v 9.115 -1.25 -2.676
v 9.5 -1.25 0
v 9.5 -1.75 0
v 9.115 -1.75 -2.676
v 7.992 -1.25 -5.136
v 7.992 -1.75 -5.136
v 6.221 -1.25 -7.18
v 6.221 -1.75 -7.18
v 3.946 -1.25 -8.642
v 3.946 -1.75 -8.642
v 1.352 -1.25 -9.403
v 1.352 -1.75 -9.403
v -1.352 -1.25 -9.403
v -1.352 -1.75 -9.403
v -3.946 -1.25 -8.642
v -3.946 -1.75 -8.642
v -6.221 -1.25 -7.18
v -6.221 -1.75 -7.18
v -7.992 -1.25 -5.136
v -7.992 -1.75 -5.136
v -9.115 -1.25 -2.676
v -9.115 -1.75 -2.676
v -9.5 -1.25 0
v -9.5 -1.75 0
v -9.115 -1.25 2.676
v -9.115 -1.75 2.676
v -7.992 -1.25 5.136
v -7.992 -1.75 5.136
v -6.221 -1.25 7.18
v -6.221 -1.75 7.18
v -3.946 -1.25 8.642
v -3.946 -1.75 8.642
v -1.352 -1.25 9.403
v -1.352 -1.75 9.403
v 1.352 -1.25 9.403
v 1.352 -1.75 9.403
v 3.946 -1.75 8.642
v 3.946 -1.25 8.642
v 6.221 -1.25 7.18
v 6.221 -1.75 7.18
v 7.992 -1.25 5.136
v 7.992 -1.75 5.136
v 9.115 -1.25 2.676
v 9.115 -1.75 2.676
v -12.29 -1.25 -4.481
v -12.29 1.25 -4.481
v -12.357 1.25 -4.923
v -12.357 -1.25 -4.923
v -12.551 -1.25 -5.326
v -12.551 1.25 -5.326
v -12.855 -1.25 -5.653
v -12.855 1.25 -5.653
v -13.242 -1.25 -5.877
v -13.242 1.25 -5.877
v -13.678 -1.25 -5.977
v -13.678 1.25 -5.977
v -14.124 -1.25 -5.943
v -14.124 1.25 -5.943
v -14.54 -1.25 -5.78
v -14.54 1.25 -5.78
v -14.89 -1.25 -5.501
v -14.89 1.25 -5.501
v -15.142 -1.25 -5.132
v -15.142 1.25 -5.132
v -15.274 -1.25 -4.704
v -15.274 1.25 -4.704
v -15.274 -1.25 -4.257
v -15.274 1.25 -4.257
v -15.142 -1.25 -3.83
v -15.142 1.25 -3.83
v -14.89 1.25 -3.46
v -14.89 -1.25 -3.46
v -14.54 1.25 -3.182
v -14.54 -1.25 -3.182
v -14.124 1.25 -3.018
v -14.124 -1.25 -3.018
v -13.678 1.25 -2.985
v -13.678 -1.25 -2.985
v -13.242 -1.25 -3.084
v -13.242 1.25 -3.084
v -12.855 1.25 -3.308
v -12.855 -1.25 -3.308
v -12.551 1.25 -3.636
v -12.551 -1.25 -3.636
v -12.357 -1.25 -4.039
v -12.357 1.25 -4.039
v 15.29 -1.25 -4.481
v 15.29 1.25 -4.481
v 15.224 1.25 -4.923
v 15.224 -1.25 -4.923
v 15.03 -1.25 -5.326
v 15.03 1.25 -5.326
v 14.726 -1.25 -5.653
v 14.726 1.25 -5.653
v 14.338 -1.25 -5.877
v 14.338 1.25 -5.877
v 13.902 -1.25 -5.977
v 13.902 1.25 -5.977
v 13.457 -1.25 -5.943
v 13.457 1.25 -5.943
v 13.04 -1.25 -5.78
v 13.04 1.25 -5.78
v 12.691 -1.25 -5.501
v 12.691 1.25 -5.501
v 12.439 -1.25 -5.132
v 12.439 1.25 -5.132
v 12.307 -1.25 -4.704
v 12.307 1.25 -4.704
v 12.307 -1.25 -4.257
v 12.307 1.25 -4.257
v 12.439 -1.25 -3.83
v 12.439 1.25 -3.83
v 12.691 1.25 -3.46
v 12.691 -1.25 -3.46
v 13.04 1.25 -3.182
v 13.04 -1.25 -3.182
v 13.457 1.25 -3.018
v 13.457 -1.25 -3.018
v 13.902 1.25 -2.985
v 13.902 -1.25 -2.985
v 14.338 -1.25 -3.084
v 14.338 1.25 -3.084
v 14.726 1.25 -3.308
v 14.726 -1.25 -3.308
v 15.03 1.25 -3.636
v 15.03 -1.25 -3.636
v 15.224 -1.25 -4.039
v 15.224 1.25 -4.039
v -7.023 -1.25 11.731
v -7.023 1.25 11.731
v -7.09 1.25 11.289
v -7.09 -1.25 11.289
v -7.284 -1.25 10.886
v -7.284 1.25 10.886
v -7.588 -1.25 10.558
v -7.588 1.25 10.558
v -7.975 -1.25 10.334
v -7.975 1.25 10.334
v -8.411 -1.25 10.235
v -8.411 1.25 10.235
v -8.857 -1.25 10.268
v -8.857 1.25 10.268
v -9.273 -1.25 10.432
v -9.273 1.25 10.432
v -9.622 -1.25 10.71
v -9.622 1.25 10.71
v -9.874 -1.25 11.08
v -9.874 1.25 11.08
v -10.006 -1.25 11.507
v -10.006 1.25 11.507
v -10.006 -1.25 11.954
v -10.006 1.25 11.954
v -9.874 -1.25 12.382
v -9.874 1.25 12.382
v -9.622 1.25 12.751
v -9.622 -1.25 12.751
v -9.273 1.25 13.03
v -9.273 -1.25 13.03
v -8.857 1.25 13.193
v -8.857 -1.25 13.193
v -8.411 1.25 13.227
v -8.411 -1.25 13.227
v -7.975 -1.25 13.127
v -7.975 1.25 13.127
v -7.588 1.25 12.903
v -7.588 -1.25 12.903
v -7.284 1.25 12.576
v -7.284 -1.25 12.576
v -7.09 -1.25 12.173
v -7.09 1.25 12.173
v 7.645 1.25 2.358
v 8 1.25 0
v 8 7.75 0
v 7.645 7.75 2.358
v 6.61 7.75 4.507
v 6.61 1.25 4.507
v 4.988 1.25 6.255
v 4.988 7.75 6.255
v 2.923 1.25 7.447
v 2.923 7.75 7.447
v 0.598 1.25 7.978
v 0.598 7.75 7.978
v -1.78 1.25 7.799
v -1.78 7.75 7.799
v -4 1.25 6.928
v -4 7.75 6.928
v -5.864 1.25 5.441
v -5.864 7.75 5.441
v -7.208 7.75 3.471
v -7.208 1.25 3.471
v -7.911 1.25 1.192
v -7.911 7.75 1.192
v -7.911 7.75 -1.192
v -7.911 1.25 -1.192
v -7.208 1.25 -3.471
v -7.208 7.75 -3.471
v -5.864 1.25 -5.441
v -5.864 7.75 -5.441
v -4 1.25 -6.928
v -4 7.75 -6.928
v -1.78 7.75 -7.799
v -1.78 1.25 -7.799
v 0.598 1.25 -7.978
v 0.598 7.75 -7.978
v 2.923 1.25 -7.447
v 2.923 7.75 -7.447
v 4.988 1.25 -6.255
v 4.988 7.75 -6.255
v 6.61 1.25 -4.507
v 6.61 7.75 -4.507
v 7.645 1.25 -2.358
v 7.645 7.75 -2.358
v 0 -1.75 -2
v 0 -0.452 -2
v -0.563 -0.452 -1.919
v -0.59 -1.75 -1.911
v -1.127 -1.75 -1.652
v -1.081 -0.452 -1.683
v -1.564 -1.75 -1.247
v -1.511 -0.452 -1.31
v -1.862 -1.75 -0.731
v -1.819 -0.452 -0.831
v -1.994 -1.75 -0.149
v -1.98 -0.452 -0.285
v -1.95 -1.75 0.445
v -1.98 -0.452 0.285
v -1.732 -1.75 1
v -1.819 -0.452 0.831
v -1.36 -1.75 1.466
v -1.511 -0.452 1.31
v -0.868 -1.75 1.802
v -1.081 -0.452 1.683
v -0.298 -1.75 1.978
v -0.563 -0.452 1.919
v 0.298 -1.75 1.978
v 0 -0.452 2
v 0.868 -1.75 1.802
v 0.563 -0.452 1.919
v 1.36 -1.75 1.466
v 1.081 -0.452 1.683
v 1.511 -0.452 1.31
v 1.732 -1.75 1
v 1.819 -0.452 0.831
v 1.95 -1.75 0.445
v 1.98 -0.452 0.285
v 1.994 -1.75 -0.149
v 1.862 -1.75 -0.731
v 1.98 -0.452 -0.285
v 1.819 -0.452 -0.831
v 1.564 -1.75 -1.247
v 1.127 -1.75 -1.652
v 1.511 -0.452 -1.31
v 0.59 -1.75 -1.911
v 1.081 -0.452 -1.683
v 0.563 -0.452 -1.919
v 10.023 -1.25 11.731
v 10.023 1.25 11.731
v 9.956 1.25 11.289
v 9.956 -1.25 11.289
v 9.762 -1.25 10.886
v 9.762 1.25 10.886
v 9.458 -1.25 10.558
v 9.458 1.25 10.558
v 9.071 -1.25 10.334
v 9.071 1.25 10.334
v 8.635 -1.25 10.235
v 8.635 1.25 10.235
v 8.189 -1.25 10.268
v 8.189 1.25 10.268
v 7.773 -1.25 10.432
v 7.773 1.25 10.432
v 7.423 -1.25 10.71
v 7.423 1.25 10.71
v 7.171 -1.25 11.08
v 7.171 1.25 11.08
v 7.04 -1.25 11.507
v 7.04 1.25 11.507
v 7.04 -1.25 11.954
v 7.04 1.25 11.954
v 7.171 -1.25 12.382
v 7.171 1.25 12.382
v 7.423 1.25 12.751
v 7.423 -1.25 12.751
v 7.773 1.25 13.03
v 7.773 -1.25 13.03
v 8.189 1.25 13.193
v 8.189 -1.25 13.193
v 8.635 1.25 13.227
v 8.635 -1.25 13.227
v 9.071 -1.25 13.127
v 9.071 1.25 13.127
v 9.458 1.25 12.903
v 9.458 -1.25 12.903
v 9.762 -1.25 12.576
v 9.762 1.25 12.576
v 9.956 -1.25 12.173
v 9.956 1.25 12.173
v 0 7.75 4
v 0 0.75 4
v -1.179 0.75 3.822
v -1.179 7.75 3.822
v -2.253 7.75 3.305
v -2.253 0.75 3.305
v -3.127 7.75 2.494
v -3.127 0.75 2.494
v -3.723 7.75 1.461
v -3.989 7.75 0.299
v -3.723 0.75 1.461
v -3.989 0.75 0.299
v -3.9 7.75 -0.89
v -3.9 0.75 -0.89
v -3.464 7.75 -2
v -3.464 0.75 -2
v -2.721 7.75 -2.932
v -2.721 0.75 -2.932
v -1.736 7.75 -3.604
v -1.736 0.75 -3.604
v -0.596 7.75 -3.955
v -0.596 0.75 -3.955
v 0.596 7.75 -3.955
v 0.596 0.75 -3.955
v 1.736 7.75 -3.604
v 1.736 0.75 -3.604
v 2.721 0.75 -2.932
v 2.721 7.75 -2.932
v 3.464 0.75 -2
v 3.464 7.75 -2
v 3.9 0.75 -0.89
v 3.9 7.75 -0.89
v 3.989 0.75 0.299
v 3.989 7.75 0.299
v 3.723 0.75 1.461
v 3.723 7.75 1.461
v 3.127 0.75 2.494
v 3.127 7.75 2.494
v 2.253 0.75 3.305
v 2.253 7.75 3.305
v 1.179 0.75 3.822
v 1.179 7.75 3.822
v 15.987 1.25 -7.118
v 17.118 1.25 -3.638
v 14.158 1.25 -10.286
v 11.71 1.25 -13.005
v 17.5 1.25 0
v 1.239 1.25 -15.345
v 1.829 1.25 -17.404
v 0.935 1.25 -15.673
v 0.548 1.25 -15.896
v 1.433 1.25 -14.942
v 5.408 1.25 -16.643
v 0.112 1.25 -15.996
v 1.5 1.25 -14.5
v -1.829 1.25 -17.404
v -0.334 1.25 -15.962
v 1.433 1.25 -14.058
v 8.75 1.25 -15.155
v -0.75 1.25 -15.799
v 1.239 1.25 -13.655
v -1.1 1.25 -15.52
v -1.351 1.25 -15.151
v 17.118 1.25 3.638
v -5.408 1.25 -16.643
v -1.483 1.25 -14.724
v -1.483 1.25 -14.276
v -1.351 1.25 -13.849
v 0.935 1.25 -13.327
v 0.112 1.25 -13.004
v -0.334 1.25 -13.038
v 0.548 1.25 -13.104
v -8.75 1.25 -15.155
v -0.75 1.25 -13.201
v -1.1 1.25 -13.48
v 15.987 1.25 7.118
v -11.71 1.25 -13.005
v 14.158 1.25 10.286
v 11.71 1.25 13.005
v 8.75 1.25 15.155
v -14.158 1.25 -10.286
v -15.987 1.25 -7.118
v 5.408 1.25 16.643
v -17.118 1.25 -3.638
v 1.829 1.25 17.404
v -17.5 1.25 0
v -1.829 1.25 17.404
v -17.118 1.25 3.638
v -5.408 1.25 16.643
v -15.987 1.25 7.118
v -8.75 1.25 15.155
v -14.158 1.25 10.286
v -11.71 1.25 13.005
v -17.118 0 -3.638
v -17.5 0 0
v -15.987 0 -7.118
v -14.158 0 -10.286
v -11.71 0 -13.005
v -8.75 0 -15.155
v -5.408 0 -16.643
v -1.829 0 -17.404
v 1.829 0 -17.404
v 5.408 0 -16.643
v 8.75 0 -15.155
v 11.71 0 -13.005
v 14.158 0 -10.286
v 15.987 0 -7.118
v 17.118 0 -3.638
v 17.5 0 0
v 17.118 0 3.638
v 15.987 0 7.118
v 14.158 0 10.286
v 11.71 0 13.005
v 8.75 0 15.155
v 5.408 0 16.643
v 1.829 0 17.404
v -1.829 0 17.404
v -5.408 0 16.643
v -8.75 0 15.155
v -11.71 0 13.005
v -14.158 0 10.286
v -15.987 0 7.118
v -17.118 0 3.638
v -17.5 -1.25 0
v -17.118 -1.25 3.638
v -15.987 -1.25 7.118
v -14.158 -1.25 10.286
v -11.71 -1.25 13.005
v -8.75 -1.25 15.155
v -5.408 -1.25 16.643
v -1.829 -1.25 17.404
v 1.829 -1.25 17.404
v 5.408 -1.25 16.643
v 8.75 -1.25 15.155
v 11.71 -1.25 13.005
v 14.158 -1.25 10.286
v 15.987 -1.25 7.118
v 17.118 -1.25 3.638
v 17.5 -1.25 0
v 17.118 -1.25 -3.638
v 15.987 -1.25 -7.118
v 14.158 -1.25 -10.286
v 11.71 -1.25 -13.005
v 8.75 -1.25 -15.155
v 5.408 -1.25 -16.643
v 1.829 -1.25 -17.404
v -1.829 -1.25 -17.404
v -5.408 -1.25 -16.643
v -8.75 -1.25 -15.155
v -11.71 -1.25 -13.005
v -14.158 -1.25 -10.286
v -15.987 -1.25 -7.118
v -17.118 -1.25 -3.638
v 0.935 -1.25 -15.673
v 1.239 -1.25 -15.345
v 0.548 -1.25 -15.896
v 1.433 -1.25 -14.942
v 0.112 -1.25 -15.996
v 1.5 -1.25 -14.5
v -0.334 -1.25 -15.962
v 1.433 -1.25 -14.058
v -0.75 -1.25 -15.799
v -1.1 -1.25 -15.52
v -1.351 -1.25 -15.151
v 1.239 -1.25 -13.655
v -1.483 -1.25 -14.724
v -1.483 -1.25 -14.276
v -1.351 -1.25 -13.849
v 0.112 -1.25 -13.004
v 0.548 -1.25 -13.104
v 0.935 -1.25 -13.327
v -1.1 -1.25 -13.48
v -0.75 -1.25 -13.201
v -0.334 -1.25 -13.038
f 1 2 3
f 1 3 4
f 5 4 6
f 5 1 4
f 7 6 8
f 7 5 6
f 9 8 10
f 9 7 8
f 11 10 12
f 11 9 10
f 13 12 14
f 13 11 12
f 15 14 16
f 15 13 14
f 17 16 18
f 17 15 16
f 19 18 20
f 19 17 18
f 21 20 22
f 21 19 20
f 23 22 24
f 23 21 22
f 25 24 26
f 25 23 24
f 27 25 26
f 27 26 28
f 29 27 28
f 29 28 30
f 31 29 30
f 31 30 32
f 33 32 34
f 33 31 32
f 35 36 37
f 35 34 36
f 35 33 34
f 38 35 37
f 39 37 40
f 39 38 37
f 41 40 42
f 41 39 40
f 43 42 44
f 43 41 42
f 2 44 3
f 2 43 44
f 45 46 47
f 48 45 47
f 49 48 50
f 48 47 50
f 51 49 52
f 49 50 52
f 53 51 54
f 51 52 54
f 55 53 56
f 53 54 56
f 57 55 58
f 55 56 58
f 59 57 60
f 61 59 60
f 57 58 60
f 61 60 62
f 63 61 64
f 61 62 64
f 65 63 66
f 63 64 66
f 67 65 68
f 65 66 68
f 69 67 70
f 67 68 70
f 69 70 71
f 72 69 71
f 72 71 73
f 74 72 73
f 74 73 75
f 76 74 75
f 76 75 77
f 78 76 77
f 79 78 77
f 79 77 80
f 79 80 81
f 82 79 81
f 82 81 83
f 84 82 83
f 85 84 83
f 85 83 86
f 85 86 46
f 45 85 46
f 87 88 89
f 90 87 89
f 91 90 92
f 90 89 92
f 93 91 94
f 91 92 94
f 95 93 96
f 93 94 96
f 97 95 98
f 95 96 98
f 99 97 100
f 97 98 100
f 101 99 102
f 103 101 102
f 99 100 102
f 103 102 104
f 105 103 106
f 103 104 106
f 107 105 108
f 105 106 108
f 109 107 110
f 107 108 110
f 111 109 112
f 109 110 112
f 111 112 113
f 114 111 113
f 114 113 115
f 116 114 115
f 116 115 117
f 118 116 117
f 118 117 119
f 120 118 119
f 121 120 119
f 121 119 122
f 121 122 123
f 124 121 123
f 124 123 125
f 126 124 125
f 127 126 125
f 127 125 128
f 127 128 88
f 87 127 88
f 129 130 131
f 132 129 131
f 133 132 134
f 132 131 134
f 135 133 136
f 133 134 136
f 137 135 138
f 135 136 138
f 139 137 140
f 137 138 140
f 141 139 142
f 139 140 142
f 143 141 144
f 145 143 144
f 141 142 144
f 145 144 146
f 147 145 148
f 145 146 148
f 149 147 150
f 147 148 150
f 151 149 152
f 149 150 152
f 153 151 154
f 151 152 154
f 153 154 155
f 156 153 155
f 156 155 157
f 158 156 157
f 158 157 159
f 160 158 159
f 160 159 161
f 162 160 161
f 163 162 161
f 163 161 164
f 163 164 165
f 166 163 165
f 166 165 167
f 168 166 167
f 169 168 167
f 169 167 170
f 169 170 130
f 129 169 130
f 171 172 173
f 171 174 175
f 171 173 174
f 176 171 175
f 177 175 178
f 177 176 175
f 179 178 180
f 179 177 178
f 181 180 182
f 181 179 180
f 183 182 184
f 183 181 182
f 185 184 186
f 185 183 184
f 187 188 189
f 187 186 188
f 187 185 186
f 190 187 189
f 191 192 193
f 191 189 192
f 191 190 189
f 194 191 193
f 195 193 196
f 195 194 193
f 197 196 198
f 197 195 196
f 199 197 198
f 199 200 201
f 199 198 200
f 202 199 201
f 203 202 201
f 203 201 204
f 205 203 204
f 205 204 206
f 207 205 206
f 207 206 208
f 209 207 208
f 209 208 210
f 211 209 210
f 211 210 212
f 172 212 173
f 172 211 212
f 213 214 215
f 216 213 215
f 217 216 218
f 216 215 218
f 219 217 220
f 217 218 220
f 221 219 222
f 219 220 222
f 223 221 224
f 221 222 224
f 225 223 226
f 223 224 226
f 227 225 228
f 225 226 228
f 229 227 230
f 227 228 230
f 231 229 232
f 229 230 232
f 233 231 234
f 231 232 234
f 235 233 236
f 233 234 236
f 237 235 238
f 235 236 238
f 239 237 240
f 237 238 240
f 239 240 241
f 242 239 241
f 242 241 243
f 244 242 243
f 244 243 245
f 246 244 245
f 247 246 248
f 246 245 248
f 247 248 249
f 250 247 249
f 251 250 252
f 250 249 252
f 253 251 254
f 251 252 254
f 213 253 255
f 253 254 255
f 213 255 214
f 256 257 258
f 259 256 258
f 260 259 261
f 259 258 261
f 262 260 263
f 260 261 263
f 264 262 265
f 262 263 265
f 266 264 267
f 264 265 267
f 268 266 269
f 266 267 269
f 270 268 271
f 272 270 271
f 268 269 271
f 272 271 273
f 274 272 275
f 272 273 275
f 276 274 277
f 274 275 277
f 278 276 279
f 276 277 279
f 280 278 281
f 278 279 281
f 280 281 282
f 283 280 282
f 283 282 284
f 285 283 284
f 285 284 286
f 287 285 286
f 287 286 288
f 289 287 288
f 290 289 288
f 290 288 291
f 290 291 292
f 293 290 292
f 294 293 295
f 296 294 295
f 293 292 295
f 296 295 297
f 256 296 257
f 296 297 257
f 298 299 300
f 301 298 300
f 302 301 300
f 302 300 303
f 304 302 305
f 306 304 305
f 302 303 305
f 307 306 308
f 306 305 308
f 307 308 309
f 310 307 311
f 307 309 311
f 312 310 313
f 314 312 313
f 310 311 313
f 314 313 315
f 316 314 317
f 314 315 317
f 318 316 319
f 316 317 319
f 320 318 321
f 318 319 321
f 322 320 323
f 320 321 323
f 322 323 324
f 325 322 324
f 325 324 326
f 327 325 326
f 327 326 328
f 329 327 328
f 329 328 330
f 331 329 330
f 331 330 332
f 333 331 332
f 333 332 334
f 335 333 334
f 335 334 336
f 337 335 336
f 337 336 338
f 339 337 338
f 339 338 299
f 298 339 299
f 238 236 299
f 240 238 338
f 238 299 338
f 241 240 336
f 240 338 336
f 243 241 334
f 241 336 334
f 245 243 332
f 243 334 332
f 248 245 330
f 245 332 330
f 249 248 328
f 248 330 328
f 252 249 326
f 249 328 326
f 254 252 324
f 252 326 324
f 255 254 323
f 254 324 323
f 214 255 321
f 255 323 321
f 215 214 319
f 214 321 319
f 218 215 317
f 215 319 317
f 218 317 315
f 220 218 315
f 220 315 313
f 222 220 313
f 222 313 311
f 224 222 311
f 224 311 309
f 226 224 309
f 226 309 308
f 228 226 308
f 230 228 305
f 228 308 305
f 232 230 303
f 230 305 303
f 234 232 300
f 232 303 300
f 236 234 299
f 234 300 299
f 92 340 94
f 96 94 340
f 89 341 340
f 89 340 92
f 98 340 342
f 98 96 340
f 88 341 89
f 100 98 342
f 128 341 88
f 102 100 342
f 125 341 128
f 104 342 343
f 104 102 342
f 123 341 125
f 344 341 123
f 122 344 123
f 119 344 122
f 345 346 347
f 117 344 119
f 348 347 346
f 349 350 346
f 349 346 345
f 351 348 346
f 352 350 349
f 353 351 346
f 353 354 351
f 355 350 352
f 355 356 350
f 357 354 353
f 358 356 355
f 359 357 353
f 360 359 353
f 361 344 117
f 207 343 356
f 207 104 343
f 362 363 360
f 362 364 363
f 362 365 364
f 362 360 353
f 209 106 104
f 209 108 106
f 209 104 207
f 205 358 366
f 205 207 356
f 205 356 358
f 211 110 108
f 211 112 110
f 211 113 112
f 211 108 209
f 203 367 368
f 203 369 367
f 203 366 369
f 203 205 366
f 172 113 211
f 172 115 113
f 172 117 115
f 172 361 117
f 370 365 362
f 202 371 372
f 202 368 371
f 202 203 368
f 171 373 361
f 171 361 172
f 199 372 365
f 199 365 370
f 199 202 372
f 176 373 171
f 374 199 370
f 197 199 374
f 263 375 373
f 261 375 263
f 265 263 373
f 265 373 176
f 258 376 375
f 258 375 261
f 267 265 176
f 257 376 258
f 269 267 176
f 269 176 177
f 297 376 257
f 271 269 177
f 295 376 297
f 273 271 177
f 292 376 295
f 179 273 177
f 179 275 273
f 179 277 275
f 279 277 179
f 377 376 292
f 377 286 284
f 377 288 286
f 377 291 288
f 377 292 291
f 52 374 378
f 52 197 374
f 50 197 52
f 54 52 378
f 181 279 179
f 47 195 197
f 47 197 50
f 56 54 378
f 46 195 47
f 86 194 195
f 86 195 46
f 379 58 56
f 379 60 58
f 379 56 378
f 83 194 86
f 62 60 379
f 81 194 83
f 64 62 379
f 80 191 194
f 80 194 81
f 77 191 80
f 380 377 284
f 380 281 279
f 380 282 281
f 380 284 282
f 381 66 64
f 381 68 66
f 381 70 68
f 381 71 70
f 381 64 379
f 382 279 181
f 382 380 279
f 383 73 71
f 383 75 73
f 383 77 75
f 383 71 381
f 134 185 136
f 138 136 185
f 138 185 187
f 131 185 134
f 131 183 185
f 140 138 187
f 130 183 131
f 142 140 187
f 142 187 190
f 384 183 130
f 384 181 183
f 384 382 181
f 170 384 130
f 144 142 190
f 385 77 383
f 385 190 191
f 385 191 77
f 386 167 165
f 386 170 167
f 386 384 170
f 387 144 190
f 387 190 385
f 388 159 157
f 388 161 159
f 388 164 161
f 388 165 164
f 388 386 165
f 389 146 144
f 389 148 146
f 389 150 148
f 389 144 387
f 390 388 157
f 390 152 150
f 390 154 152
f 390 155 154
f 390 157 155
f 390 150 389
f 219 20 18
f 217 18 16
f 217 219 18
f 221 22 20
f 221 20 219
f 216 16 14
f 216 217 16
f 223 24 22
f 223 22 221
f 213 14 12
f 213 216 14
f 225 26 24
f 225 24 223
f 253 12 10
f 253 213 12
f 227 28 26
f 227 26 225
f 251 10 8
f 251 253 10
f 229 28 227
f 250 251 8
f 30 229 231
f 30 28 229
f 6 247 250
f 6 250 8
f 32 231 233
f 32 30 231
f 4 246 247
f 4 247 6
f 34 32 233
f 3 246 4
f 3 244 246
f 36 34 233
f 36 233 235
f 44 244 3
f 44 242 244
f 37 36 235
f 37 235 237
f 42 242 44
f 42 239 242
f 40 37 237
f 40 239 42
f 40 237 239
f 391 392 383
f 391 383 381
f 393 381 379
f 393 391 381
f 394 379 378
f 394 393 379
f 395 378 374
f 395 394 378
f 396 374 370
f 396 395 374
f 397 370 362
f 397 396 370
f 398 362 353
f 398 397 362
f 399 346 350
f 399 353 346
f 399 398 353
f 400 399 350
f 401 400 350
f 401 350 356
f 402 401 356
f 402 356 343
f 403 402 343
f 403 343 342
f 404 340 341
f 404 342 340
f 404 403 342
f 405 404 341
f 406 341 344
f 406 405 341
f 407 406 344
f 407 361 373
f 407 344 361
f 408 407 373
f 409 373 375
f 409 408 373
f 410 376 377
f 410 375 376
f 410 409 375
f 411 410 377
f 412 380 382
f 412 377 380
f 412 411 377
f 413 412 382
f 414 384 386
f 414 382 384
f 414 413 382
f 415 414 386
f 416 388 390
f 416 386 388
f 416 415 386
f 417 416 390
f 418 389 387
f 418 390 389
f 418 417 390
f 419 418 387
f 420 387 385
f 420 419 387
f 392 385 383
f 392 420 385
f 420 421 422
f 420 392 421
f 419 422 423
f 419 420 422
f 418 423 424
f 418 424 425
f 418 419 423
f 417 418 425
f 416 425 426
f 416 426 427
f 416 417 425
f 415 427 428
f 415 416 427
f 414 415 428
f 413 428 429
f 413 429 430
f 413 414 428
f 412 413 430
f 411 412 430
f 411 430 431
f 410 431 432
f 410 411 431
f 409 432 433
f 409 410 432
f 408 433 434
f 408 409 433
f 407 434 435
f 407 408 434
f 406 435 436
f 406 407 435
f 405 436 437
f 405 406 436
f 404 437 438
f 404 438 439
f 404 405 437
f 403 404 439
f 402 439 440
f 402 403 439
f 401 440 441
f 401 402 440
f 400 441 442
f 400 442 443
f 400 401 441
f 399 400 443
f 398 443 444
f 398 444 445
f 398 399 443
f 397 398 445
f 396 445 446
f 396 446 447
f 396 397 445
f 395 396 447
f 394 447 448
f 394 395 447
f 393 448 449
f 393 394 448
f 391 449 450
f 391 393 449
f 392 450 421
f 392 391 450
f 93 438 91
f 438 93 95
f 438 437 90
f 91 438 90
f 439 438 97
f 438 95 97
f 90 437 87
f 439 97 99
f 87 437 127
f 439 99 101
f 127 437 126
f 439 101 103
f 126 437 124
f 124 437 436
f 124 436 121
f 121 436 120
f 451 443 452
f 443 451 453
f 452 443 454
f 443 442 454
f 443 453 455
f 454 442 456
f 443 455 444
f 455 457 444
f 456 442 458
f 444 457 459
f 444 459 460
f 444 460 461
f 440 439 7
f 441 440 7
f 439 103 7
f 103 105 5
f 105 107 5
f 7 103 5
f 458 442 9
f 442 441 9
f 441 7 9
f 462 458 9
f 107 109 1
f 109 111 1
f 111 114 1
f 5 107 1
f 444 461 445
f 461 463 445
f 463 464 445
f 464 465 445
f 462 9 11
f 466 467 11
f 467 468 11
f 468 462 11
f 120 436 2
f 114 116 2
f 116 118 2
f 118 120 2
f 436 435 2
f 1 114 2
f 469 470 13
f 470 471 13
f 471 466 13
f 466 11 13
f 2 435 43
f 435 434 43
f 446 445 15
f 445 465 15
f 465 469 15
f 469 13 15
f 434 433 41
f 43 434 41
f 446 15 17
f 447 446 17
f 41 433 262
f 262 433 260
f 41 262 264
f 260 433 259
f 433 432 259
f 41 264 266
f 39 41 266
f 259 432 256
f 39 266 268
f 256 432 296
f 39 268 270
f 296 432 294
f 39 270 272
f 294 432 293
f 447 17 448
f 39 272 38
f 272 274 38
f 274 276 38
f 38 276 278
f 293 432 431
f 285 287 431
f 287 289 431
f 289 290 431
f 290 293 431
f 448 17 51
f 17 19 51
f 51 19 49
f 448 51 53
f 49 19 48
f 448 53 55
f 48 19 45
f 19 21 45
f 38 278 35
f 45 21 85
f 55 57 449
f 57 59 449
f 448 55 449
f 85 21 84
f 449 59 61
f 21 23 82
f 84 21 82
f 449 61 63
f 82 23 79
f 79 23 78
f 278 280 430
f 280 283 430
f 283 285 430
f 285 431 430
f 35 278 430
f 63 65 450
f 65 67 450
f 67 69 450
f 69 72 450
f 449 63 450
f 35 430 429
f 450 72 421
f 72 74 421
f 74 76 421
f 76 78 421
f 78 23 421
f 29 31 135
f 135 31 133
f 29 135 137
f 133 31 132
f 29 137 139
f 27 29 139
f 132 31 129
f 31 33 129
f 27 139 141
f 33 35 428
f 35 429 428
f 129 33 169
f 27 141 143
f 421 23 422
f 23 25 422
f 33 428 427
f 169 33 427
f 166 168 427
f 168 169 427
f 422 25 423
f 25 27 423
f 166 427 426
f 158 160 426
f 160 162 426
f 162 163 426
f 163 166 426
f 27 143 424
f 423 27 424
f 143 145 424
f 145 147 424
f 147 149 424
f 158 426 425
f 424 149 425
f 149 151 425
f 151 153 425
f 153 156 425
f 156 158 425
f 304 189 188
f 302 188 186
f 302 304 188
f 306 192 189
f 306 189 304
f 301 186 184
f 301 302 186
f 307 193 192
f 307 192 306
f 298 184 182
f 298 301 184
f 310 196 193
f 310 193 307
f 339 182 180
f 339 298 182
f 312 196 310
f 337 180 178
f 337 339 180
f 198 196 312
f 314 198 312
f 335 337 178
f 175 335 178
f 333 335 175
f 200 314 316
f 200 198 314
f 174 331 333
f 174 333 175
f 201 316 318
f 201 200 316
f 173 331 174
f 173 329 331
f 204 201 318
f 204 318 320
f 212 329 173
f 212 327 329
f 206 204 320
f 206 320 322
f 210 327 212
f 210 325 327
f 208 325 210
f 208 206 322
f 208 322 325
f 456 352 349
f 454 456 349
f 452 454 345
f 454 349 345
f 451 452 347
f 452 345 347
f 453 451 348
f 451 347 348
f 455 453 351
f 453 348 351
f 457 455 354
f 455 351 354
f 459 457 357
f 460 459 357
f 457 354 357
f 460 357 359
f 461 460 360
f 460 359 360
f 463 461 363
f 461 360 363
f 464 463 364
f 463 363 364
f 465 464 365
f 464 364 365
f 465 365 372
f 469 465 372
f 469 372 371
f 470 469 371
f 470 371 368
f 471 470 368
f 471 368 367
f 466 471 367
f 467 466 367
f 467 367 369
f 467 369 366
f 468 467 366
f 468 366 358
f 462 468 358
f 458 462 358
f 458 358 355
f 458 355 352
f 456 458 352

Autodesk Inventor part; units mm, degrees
ref_plane "YZ Plane" through (0, 0, 0) normal (1, 0, 0) x (0, 1, 0)
ref_plane "XZ Plane" through (0, 0, 0) normal (0, 1, 0) x (-1, 0, 0)
ref_plane "XY Plane" through (0, 0, 0) normal (0, 0, 1) x (1, 0, 0)
sketch "Sketch1" plane through (0, 0, 0) normal (0, 1, 0) x (-1, 0, 0)
  circle A0 centre (0, 0) radius 17.5
  dimension "d0" = 35
extrude "Extrusion1" add sketch "Sketch1" along normal mid plane 2.5
sketch "Sketch2" plane through (0, 1.25, 0) normal (0, 1, 0) x (1, 0, 0)
  circle A0 centre (0, 0) radius 8
  dimension "d3" = 16
extrude "Extrusion2" add sketch "Sketch2" along normal blind 6.5
sketch "Sketch3" plane through (0, -1.25, 0) normal (0, -1, 0) x (1, 0, 0)
  circle A0 centre (0, 0) radius 9.5
  dimension "d6" = 19
extrude "Extrusion3" add sketch "Sketch3" along normal blind 0.5
sketch "Sketch6" plane through (0, 1.25, 0) normal (0, 1, 0) x (1, 0, 0)
  circle A0 centre (0, 14.5) radius 1.5
  circle A1 centre (-13.7903, 4.4807) radius 1.5
  circle A2 centre (-8.5229, -11.7307) radius 1.5
  circle A3 centre (8.5229, -11.7307) radius 1.5
  circle A4 centre (13.7903, 4.4807) radius 1.5
  point P0 (0, 0)
  dimension "d17" = 3
  dimension "d18" = 14.5
  dimension "d21" = 360
extrude "Extrusion6" cut sketch "Sketch6" against normal through all
sketch "Sketch7" plane through (0, 7.75, 0) normal (0, 1, 0) x (1, 0, 0)
  point P0 (0, 0)
  point P1 (0, 0)
hole "Hole1" at (0, 7.75, 0) direction (0, -1, 0) diameter 8 depth 7 tip angle 118
sketch "Sketch8" plane through (0, -1.75, 0) normal (0, -1, 0) x (1, 0, 0)
  point P0 (0, 0)
hole "Hole2" at (0, -1.75, 0) direction (0, 1, 0) diameter 4 end through all
thread "Thread2" size "M8x1.25" class "6H" standard "ANSI Metric M Profile" full length
properties material "Iron, Cast"
